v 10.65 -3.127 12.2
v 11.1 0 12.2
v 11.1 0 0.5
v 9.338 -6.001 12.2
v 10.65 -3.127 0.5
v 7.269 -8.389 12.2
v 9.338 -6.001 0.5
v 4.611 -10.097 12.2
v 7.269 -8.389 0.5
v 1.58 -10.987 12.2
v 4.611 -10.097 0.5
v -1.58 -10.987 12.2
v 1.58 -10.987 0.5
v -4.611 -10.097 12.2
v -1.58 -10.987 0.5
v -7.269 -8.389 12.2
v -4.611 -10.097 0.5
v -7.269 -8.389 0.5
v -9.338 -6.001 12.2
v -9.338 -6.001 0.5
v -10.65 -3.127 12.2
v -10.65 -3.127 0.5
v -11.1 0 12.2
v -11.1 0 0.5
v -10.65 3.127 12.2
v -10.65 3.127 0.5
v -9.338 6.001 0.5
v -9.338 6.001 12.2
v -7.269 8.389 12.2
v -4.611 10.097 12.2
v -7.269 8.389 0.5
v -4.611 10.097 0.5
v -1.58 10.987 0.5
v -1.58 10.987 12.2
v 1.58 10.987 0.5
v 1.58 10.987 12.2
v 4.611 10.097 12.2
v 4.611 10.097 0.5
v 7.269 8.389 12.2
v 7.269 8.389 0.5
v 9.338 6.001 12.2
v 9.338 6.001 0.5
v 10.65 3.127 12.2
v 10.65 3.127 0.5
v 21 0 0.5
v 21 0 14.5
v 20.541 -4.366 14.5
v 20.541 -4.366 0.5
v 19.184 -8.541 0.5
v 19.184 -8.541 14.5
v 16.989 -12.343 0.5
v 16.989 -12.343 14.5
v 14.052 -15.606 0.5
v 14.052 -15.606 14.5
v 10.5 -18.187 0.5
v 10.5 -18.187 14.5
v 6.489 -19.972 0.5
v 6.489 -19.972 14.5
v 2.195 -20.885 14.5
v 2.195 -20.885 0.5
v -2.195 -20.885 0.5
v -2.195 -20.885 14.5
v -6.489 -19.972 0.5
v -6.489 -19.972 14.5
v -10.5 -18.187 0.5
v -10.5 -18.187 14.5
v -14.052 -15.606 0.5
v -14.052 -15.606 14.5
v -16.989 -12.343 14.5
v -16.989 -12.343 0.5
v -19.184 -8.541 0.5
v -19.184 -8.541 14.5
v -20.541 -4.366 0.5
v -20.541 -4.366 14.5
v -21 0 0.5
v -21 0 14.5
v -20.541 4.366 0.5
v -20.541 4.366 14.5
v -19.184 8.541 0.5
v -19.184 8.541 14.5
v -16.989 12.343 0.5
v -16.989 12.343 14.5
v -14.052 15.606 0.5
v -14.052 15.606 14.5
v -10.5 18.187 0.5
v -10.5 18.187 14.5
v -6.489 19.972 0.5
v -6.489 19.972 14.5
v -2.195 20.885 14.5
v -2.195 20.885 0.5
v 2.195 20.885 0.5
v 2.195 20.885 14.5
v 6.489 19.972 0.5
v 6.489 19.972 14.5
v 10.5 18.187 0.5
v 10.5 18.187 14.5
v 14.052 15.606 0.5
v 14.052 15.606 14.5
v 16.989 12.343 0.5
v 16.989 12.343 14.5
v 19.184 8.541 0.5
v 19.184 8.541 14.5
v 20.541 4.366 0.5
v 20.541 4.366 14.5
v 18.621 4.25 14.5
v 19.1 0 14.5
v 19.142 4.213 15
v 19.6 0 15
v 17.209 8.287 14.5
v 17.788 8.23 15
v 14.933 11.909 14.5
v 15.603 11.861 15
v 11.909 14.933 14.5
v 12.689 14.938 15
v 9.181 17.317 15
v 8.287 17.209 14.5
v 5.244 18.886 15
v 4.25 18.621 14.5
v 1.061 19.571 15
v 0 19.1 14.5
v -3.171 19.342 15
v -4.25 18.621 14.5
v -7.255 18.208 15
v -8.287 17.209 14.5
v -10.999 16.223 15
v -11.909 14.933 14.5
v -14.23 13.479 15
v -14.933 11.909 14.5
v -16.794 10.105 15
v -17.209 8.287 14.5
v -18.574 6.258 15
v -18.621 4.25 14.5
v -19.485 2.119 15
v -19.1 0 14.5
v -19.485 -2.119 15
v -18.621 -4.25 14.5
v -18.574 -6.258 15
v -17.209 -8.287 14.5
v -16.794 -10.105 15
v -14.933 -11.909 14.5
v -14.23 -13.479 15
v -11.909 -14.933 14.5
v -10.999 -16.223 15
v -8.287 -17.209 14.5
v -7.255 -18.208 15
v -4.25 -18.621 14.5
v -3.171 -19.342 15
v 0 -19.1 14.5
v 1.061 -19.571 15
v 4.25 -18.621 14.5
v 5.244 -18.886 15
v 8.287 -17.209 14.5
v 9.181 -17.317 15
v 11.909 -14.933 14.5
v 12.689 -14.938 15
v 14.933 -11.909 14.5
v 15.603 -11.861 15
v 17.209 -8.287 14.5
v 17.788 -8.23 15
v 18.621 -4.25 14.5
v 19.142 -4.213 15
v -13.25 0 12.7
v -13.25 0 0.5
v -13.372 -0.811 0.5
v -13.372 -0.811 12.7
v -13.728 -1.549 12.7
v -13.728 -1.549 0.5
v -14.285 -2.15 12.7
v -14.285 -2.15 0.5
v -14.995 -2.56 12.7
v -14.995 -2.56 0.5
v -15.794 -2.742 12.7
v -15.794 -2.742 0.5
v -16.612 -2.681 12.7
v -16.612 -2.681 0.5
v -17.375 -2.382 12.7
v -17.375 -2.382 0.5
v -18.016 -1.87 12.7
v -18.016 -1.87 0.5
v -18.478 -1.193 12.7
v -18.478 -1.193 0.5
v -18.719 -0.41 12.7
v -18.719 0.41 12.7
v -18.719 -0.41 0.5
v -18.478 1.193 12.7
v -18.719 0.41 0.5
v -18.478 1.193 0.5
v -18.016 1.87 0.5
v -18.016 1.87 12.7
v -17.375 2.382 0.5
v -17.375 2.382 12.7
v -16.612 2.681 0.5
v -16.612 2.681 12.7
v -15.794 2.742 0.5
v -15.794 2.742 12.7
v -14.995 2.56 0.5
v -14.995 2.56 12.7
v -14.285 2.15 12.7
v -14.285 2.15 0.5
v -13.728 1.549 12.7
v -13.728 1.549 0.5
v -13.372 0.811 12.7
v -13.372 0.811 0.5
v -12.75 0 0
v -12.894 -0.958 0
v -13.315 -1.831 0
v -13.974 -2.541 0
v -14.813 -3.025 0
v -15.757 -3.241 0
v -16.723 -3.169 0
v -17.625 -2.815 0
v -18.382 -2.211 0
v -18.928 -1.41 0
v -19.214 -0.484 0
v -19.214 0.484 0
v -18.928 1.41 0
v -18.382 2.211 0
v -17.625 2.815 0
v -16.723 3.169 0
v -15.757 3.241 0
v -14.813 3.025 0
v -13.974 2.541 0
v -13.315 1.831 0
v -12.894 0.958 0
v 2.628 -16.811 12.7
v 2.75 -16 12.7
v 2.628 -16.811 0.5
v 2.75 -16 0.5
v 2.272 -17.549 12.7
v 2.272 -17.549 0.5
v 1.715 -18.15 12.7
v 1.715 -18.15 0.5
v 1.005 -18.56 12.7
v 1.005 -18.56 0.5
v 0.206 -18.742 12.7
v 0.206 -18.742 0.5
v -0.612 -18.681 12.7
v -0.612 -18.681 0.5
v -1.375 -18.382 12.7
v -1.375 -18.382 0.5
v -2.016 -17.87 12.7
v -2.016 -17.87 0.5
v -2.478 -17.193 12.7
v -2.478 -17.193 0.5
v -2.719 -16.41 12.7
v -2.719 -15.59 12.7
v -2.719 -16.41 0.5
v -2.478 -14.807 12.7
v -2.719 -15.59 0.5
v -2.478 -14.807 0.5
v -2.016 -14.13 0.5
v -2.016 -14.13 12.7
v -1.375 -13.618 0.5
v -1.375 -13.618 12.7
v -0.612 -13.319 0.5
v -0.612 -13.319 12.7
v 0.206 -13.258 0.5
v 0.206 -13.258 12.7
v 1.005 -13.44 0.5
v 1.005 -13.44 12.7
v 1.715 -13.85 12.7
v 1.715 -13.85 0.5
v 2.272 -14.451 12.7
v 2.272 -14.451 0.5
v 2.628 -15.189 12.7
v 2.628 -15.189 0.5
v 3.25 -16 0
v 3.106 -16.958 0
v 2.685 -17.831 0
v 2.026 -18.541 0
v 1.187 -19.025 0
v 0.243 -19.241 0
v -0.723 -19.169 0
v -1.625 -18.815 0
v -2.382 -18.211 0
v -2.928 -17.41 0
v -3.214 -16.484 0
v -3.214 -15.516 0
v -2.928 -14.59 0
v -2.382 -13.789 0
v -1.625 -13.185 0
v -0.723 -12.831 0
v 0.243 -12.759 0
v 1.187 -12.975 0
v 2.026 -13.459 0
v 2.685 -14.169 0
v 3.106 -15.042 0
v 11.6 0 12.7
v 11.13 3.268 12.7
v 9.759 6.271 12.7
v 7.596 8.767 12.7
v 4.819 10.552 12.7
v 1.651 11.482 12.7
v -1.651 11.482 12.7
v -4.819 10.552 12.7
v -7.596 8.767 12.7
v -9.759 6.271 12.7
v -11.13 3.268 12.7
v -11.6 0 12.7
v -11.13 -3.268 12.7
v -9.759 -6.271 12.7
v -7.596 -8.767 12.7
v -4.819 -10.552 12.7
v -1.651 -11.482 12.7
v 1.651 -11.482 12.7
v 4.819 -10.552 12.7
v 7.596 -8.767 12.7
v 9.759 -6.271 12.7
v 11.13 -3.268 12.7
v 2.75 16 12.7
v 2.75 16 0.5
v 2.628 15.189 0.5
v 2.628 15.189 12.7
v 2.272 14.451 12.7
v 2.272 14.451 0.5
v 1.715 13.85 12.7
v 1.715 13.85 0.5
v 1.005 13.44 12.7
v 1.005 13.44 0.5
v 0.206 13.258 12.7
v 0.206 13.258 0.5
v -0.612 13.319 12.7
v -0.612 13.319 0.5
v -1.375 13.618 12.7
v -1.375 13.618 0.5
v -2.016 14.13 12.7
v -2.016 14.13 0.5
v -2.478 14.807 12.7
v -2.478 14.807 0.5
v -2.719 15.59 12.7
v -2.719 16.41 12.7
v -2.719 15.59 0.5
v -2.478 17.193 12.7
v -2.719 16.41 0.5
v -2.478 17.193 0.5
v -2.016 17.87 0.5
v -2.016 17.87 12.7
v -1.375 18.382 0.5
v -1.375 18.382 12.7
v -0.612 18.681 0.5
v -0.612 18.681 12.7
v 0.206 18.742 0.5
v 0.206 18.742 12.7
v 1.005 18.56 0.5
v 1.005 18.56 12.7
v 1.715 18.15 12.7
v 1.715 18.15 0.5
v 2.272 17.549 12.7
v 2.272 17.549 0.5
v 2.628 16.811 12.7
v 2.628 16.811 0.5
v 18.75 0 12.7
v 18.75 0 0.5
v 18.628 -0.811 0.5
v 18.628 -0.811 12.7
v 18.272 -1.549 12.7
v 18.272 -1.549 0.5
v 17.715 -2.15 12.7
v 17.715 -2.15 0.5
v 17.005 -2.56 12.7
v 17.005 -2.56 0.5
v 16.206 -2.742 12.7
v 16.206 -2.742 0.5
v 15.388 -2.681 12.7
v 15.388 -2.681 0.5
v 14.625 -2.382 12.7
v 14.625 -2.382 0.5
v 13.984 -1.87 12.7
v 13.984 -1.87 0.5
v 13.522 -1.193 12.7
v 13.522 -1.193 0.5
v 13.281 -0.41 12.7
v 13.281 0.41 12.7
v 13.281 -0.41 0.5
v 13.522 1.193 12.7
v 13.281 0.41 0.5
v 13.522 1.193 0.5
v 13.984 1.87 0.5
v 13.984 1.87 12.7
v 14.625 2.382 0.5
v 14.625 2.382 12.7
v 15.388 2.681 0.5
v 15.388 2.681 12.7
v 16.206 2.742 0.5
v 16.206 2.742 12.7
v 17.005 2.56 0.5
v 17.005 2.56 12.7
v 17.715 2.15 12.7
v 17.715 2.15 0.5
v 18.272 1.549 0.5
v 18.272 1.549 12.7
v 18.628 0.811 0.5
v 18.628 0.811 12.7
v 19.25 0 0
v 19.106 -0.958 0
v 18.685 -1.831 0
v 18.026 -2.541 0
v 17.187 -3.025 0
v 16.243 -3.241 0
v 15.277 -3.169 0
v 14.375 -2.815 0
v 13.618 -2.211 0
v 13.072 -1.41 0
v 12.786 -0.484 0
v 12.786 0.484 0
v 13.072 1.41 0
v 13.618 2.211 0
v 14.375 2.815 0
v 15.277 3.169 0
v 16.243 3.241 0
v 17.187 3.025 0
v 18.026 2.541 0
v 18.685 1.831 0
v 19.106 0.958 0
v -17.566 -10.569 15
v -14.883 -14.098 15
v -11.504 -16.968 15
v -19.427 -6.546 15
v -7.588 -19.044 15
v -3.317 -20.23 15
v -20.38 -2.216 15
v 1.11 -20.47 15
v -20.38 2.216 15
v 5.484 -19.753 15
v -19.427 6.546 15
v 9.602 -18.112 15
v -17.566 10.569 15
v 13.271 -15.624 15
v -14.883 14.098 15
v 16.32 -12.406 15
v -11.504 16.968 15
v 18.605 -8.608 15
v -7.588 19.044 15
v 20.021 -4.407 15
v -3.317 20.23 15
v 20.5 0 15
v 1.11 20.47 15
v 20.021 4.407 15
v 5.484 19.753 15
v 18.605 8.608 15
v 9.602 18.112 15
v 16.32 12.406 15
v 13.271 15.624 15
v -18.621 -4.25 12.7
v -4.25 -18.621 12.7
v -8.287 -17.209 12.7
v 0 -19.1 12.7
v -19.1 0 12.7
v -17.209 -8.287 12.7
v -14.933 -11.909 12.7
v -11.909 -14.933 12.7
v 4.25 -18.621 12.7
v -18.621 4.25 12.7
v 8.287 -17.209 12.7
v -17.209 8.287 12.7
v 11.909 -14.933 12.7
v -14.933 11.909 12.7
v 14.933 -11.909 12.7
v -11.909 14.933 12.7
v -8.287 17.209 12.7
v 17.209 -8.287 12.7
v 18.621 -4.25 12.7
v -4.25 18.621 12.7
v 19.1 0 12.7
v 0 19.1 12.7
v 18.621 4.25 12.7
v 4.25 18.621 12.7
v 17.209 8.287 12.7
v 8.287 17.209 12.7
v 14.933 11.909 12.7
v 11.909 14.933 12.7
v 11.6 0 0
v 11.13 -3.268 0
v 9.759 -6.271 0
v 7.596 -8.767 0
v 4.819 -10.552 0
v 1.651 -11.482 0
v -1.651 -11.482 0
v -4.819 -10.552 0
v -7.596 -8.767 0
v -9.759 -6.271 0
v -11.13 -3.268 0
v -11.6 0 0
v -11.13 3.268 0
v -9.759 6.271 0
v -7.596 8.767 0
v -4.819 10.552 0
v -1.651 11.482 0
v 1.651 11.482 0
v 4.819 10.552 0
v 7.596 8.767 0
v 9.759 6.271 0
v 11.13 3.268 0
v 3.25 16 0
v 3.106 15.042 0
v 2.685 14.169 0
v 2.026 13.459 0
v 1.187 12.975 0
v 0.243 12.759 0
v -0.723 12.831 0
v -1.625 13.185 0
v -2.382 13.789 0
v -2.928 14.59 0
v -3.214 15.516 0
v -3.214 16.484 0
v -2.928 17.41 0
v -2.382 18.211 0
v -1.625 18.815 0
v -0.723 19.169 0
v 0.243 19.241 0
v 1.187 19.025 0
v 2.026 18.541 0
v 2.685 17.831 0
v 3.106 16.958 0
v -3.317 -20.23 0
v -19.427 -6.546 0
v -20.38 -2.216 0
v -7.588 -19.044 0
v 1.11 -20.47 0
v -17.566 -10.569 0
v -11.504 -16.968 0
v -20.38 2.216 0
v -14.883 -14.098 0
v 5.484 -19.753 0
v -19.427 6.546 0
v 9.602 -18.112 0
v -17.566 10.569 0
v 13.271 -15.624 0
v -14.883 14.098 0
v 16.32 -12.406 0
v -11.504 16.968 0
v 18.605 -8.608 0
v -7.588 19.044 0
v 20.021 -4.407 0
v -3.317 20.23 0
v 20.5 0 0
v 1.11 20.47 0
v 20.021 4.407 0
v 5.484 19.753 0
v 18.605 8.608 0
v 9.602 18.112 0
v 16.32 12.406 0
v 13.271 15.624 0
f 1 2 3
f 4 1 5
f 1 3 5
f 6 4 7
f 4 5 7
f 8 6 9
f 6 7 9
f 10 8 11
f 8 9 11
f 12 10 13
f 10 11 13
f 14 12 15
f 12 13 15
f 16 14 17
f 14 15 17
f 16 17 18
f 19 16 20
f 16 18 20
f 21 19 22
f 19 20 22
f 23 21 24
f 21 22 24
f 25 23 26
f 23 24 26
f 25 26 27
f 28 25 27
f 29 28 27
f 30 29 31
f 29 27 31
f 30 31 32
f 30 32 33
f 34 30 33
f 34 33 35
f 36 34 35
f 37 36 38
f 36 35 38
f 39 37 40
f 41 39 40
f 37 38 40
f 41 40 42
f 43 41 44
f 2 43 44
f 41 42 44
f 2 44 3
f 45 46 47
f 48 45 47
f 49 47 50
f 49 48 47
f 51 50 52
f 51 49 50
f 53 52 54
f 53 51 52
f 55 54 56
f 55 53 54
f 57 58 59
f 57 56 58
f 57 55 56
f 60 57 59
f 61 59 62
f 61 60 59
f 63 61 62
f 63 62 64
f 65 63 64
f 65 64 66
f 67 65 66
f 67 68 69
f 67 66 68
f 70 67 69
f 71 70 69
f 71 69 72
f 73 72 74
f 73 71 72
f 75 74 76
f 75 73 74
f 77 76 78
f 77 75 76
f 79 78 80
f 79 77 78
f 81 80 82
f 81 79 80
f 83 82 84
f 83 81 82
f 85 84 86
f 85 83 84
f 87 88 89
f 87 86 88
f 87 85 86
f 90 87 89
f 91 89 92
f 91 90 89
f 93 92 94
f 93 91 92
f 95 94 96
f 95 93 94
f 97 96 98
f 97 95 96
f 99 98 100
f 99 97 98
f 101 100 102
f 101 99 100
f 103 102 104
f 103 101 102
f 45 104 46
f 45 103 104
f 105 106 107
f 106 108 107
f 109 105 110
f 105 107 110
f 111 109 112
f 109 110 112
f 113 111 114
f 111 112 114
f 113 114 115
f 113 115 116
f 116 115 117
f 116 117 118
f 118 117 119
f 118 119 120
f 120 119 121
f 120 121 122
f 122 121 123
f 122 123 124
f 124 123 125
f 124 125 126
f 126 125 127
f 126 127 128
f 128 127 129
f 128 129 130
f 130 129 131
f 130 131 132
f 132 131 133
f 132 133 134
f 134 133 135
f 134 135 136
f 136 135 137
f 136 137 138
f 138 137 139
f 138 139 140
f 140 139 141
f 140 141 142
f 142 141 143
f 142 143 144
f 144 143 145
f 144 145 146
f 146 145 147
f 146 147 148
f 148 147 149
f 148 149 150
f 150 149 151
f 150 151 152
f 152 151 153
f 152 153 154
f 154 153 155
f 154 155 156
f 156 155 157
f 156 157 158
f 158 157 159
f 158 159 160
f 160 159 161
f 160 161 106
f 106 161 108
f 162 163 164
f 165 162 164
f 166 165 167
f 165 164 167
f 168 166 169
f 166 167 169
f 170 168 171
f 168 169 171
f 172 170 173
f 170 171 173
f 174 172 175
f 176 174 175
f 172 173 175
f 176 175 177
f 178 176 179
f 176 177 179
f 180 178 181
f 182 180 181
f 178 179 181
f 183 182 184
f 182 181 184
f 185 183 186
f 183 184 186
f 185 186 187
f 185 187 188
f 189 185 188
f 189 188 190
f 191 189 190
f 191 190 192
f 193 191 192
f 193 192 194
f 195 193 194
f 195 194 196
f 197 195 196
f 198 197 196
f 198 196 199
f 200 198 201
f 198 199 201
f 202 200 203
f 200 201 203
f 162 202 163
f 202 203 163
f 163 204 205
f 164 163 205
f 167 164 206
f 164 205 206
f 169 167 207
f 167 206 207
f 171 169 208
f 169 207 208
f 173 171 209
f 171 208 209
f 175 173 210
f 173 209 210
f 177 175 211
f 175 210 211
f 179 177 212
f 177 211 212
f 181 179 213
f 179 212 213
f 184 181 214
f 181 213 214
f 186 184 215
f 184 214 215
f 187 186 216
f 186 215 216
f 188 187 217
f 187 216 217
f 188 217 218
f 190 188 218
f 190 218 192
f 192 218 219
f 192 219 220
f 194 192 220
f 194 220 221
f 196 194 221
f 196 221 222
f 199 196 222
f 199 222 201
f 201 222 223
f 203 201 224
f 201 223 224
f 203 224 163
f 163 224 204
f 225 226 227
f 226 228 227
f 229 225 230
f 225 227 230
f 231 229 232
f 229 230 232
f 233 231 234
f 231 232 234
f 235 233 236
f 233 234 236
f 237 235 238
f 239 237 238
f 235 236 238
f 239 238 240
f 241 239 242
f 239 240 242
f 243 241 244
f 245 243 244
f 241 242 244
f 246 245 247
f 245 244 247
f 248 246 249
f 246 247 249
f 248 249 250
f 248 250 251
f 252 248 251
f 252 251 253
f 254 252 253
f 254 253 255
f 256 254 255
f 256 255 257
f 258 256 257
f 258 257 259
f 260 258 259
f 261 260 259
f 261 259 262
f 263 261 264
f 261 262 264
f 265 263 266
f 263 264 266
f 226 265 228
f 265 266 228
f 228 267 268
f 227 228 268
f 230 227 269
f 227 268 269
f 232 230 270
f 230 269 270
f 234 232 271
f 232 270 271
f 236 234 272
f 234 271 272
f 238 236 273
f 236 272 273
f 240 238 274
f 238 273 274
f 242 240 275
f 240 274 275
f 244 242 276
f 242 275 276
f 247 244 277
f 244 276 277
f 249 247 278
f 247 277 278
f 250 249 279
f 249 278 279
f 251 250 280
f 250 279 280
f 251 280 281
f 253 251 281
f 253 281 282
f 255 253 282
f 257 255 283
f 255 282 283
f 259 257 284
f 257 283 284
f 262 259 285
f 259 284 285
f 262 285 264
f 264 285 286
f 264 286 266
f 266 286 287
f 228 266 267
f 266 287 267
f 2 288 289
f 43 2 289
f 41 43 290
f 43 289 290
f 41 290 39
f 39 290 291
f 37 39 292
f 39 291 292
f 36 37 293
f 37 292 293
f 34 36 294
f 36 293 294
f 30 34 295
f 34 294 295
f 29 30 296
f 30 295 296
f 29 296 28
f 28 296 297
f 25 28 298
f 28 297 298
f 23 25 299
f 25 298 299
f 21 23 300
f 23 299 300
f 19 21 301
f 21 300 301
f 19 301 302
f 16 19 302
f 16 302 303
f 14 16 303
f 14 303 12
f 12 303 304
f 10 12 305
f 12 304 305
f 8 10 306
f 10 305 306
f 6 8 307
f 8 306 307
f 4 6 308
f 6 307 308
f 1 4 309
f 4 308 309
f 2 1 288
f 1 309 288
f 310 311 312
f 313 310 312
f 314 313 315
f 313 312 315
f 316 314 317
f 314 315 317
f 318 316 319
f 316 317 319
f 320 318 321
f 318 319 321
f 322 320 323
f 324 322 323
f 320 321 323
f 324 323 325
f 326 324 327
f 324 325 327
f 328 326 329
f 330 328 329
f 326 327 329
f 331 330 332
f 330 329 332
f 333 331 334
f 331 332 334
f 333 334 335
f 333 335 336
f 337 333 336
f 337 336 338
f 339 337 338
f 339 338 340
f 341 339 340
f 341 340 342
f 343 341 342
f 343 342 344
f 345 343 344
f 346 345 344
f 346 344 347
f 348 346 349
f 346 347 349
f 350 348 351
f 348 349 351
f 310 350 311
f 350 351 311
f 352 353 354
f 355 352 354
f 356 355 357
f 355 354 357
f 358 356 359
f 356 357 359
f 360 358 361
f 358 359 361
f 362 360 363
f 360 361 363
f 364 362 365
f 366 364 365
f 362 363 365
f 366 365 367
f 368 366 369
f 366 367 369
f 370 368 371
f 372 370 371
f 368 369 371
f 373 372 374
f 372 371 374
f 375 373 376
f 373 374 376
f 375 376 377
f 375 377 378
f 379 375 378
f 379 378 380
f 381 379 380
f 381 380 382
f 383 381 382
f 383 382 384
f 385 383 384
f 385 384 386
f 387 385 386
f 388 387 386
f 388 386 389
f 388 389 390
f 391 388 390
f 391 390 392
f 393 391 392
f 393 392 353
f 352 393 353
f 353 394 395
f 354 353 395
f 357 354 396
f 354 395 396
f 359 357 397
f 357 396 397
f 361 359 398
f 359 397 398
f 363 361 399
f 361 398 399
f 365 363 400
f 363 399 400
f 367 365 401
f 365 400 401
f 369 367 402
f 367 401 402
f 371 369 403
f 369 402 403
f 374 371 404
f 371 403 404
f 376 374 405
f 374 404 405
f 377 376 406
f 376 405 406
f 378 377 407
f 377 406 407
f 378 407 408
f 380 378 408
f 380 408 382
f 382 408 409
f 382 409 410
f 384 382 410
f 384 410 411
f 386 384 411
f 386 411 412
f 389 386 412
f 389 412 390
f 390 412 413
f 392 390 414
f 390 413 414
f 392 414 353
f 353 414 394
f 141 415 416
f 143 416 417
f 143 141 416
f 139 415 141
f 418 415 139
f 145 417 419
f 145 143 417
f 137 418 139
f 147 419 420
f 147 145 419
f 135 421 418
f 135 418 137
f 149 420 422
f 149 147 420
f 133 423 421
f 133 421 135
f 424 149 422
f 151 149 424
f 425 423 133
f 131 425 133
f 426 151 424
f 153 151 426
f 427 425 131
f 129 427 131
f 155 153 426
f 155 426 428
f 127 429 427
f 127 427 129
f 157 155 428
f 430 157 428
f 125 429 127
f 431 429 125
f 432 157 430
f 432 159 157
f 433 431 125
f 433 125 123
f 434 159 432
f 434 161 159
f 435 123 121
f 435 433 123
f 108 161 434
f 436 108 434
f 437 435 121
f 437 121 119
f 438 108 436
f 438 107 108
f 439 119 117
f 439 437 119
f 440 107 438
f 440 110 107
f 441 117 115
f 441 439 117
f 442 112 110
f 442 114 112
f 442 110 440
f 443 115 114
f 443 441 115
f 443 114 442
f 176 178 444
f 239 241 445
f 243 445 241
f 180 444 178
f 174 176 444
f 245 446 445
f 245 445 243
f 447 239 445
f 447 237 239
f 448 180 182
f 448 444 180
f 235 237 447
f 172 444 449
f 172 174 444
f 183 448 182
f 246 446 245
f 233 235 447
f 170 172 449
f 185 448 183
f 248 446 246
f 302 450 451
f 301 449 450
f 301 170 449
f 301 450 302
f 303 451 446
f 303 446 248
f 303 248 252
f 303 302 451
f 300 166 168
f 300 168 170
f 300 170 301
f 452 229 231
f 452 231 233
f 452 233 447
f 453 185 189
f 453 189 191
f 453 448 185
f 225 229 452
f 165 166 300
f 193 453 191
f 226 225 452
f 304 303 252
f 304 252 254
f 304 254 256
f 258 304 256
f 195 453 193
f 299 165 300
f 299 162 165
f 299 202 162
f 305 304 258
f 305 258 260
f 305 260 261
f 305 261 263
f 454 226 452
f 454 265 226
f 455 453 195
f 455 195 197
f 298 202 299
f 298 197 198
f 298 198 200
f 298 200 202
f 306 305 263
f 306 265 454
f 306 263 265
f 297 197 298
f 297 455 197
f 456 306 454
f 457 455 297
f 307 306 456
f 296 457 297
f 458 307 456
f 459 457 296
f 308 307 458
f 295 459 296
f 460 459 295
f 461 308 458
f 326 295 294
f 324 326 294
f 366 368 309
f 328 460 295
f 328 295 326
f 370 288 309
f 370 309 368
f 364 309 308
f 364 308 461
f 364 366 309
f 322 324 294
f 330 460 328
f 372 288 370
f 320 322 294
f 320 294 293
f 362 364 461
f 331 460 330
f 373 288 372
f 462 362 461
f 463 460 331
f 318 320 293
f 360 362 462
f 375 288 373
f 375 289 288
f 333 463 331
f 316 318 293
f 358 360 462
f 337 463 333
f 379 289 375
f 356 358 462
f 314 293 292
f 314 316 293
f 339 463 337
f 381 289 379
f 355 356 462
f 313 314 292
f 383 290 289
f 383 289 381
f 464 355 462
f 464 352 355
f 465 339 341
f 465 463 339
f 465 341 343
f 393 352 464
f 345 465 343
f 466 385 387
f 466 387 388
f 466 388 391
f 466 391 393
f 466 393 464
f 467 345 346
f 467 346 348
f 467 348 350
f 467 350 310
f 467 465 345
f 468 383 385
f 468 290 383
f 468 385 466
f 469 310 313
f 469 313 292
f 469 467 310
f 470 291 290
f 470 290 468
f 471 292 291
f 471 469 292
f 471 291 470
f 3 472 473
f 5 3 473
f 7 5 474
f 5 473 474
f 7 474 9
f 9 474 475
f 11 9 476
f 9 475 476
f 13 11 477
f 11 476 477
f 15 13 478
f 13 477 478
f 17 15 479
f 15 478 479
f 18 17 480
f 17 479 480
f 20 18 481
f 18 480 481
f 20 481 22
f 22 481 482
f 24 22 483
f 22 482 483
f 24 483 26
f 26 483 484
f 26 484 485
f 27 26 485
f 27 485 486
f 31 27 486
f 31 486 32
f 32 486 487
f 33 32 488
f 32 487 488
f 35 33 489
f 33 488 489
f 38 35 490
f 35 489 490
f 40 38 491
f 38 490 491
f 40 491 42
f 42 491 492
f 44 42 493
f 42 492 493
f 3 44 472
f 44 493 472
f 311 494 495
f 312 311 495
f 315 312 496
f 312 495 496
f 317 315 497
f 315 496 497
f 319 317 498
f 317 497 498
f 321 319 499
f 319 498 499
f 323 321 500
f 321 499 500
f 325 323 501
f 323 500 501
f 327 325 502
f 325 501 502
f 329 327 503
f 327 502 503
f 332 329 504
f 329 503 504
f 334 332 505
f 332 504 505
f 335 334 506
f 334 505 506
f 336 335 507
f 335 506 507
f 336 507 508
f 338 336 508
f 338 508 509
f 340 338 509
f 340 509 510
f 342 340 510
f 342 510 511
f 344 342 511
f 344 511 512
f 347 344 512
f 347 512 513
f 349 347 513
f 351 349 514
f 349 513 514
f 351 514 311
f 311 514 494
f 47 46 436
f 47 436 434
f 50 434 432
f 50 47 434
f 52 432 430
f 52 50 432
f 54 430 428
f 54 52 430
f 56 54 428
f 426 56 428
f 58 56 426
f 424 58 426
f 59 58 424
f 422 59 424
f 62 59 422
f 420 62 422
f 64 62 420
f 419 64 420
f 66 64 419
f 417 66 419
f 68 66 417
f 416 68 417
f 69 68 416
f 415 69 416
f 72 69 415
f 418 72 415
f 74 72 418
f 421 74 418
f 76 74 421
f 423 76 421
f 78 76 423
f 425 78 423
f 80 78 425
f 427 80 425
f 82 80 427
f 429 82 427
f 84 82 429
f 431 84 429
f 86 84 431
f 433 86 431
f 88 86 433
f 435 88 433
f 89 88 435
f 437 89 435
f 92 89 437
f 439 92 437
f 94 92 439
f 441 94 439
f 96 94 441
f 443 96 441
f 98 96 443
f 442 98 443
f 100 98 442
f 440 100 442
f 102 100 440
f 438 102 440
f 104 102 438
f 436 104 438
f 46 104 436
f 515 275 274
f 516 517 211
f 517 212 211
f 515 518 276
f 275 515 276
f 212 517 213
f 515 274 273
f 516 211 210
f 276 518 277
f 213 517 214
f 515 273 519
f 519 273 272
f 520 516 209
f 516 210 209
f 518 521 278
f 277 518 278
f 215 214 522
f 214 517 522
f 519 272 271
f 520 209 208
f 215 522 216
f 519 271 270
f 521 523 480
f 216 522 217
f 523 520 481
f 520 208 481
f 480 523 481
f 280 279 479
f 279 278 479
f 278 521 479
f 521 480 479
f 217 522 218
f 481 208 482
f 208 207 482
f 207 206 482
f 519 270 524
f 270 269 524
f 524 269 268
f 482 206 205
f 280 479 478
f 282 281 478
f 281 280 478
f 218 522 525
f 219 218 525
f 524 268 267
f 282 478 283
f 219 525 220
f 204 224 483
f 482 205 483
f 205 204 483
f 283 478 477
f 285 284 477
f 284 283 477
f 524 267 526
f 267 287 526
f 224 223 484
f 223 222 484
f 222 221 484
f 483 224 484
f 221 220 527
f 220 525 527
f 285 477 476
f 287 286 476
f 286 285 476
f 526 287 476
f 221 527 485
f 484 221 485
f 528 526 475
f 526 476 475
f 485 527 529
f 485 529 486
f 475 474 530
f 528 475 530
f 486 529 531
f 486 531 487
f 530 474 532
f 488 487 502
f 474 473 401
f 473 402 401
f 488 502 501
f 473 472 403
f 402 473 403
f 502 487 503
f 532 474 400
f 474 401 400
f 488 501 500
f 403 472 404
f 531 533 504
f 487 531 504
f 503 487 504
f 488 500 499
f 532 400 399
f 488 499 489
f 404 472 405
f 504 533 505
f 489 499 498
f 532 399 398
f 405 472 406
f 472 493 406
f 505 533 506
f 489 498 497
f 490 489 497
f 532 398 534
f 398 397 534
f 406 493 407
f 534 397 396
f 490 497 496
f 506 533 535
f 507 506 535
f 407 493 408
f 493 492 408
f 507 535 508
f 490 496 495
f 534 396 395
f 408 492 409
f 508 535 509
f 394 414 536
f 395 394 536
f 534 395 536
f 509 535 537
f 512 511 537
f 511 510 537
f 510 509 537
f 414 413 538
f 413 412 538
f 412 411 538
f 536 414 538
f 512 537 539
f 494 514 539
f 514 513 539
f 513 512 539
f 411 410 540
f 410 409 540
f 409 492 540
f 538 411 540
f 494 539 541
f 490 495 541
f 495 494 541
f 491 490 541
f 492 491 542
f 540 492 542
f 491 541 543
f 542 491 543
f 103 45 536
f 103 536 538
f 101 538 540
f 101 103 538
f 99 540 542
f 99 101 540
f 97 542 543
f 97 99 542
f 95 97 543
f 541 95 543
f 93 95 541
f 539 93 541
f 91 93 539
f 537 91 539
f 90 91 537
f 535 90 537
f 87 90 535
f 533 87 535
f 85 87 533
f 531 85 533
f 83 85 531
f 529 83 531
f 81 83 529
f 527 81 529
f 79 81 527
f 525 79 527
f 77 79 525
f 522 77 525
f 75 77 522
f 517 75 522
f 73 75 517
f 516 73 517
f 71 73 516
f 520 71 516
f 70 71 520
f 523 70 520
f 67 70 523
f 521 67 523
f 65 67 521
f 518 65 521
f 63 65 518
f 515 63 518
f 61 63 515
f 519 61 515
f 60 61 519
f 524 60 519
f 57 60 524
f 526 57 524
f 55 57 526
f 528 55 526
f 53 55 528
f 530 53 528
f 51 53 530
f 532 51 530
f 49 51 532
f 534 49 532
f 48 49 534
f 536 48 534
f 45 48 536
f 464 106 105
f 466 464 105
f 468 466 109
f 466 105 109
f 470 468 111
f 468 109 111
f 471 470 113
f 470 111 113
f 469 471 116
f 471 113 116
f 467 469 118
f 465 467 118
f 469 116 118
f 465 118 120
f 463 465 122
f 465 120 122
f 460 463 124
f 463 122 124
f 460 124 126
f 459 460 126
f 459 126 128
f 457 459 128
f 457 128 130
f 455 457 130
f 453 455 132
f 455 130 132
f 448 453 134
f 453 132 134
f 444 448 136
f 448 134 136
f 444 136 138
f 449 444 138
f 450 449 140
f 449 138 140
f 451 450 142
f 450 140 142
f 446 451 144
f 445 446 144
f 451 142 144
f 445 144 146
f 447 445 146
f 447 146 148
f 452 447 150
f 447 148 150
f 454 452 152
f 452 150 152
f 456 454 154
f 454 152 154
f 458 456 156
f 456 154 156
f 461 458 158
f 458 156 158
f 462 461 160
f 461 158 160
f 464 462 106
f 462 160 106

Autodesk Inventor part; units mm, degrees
ref_plane "YZ Plane" through (0, 0, 0) normal (1, 0, 0) x (0, 1, 0)
ref_plane "XZ Plane" through (0, 0, 0) normal (0, 1, 0) x (-1, 0, 0)
ref_plane "XY Plane" through (0, 0, 0) normal (0, 0, 1) x (1, 0, 0)
sketch "Sketch1" plane through (0, 0, 0) normal (0, 0, 1) x (1, 0, 0)
  circle A0 centre (0, 0) radius 21
  circle A1 centre (16, 0) radius 2.75
  circle A2 centre (0, 16) radius 2.75
  circle A3 centre (-16, 0) radius 2.75
  circle A4 centre (0, -16) radius 2.75
  circle A5 centre (0, 0) radius 11.1
  dimension "d0" = 42
  dimension "d1" = 5.5
  dimension "d2" = 16
  dimension "d5" = 360
  dimension "d7" = 22.2
extrude "Extrusion1" add sketch "Sketch1" along normal blind 15
sketch "Sketch2" plane through (0, 0, 15) normal (0, 0, 1) x (1, 0, 0)
  circle A0 centre (0, 0) radius 19.1
  dimension "d10" = 38.2
extrude "Extrusion2" cut sketch "Sketch2" against normal blind 2.3
chamfer "Chamfer1" distance 0.5 angle 45 9 edges at (-21, 0, 0) (-21, 0, 15) (-11.1, 0, 0) (-2.75, -16, 0) (-2.75, 16, 0) (13.25, 0, 0) (-18.75, 0, 0) (-11.1, 0, 12.7) (-19.1, 0, 15)
properties part number "spacer nema23" material "PC/ABS Plastic"
